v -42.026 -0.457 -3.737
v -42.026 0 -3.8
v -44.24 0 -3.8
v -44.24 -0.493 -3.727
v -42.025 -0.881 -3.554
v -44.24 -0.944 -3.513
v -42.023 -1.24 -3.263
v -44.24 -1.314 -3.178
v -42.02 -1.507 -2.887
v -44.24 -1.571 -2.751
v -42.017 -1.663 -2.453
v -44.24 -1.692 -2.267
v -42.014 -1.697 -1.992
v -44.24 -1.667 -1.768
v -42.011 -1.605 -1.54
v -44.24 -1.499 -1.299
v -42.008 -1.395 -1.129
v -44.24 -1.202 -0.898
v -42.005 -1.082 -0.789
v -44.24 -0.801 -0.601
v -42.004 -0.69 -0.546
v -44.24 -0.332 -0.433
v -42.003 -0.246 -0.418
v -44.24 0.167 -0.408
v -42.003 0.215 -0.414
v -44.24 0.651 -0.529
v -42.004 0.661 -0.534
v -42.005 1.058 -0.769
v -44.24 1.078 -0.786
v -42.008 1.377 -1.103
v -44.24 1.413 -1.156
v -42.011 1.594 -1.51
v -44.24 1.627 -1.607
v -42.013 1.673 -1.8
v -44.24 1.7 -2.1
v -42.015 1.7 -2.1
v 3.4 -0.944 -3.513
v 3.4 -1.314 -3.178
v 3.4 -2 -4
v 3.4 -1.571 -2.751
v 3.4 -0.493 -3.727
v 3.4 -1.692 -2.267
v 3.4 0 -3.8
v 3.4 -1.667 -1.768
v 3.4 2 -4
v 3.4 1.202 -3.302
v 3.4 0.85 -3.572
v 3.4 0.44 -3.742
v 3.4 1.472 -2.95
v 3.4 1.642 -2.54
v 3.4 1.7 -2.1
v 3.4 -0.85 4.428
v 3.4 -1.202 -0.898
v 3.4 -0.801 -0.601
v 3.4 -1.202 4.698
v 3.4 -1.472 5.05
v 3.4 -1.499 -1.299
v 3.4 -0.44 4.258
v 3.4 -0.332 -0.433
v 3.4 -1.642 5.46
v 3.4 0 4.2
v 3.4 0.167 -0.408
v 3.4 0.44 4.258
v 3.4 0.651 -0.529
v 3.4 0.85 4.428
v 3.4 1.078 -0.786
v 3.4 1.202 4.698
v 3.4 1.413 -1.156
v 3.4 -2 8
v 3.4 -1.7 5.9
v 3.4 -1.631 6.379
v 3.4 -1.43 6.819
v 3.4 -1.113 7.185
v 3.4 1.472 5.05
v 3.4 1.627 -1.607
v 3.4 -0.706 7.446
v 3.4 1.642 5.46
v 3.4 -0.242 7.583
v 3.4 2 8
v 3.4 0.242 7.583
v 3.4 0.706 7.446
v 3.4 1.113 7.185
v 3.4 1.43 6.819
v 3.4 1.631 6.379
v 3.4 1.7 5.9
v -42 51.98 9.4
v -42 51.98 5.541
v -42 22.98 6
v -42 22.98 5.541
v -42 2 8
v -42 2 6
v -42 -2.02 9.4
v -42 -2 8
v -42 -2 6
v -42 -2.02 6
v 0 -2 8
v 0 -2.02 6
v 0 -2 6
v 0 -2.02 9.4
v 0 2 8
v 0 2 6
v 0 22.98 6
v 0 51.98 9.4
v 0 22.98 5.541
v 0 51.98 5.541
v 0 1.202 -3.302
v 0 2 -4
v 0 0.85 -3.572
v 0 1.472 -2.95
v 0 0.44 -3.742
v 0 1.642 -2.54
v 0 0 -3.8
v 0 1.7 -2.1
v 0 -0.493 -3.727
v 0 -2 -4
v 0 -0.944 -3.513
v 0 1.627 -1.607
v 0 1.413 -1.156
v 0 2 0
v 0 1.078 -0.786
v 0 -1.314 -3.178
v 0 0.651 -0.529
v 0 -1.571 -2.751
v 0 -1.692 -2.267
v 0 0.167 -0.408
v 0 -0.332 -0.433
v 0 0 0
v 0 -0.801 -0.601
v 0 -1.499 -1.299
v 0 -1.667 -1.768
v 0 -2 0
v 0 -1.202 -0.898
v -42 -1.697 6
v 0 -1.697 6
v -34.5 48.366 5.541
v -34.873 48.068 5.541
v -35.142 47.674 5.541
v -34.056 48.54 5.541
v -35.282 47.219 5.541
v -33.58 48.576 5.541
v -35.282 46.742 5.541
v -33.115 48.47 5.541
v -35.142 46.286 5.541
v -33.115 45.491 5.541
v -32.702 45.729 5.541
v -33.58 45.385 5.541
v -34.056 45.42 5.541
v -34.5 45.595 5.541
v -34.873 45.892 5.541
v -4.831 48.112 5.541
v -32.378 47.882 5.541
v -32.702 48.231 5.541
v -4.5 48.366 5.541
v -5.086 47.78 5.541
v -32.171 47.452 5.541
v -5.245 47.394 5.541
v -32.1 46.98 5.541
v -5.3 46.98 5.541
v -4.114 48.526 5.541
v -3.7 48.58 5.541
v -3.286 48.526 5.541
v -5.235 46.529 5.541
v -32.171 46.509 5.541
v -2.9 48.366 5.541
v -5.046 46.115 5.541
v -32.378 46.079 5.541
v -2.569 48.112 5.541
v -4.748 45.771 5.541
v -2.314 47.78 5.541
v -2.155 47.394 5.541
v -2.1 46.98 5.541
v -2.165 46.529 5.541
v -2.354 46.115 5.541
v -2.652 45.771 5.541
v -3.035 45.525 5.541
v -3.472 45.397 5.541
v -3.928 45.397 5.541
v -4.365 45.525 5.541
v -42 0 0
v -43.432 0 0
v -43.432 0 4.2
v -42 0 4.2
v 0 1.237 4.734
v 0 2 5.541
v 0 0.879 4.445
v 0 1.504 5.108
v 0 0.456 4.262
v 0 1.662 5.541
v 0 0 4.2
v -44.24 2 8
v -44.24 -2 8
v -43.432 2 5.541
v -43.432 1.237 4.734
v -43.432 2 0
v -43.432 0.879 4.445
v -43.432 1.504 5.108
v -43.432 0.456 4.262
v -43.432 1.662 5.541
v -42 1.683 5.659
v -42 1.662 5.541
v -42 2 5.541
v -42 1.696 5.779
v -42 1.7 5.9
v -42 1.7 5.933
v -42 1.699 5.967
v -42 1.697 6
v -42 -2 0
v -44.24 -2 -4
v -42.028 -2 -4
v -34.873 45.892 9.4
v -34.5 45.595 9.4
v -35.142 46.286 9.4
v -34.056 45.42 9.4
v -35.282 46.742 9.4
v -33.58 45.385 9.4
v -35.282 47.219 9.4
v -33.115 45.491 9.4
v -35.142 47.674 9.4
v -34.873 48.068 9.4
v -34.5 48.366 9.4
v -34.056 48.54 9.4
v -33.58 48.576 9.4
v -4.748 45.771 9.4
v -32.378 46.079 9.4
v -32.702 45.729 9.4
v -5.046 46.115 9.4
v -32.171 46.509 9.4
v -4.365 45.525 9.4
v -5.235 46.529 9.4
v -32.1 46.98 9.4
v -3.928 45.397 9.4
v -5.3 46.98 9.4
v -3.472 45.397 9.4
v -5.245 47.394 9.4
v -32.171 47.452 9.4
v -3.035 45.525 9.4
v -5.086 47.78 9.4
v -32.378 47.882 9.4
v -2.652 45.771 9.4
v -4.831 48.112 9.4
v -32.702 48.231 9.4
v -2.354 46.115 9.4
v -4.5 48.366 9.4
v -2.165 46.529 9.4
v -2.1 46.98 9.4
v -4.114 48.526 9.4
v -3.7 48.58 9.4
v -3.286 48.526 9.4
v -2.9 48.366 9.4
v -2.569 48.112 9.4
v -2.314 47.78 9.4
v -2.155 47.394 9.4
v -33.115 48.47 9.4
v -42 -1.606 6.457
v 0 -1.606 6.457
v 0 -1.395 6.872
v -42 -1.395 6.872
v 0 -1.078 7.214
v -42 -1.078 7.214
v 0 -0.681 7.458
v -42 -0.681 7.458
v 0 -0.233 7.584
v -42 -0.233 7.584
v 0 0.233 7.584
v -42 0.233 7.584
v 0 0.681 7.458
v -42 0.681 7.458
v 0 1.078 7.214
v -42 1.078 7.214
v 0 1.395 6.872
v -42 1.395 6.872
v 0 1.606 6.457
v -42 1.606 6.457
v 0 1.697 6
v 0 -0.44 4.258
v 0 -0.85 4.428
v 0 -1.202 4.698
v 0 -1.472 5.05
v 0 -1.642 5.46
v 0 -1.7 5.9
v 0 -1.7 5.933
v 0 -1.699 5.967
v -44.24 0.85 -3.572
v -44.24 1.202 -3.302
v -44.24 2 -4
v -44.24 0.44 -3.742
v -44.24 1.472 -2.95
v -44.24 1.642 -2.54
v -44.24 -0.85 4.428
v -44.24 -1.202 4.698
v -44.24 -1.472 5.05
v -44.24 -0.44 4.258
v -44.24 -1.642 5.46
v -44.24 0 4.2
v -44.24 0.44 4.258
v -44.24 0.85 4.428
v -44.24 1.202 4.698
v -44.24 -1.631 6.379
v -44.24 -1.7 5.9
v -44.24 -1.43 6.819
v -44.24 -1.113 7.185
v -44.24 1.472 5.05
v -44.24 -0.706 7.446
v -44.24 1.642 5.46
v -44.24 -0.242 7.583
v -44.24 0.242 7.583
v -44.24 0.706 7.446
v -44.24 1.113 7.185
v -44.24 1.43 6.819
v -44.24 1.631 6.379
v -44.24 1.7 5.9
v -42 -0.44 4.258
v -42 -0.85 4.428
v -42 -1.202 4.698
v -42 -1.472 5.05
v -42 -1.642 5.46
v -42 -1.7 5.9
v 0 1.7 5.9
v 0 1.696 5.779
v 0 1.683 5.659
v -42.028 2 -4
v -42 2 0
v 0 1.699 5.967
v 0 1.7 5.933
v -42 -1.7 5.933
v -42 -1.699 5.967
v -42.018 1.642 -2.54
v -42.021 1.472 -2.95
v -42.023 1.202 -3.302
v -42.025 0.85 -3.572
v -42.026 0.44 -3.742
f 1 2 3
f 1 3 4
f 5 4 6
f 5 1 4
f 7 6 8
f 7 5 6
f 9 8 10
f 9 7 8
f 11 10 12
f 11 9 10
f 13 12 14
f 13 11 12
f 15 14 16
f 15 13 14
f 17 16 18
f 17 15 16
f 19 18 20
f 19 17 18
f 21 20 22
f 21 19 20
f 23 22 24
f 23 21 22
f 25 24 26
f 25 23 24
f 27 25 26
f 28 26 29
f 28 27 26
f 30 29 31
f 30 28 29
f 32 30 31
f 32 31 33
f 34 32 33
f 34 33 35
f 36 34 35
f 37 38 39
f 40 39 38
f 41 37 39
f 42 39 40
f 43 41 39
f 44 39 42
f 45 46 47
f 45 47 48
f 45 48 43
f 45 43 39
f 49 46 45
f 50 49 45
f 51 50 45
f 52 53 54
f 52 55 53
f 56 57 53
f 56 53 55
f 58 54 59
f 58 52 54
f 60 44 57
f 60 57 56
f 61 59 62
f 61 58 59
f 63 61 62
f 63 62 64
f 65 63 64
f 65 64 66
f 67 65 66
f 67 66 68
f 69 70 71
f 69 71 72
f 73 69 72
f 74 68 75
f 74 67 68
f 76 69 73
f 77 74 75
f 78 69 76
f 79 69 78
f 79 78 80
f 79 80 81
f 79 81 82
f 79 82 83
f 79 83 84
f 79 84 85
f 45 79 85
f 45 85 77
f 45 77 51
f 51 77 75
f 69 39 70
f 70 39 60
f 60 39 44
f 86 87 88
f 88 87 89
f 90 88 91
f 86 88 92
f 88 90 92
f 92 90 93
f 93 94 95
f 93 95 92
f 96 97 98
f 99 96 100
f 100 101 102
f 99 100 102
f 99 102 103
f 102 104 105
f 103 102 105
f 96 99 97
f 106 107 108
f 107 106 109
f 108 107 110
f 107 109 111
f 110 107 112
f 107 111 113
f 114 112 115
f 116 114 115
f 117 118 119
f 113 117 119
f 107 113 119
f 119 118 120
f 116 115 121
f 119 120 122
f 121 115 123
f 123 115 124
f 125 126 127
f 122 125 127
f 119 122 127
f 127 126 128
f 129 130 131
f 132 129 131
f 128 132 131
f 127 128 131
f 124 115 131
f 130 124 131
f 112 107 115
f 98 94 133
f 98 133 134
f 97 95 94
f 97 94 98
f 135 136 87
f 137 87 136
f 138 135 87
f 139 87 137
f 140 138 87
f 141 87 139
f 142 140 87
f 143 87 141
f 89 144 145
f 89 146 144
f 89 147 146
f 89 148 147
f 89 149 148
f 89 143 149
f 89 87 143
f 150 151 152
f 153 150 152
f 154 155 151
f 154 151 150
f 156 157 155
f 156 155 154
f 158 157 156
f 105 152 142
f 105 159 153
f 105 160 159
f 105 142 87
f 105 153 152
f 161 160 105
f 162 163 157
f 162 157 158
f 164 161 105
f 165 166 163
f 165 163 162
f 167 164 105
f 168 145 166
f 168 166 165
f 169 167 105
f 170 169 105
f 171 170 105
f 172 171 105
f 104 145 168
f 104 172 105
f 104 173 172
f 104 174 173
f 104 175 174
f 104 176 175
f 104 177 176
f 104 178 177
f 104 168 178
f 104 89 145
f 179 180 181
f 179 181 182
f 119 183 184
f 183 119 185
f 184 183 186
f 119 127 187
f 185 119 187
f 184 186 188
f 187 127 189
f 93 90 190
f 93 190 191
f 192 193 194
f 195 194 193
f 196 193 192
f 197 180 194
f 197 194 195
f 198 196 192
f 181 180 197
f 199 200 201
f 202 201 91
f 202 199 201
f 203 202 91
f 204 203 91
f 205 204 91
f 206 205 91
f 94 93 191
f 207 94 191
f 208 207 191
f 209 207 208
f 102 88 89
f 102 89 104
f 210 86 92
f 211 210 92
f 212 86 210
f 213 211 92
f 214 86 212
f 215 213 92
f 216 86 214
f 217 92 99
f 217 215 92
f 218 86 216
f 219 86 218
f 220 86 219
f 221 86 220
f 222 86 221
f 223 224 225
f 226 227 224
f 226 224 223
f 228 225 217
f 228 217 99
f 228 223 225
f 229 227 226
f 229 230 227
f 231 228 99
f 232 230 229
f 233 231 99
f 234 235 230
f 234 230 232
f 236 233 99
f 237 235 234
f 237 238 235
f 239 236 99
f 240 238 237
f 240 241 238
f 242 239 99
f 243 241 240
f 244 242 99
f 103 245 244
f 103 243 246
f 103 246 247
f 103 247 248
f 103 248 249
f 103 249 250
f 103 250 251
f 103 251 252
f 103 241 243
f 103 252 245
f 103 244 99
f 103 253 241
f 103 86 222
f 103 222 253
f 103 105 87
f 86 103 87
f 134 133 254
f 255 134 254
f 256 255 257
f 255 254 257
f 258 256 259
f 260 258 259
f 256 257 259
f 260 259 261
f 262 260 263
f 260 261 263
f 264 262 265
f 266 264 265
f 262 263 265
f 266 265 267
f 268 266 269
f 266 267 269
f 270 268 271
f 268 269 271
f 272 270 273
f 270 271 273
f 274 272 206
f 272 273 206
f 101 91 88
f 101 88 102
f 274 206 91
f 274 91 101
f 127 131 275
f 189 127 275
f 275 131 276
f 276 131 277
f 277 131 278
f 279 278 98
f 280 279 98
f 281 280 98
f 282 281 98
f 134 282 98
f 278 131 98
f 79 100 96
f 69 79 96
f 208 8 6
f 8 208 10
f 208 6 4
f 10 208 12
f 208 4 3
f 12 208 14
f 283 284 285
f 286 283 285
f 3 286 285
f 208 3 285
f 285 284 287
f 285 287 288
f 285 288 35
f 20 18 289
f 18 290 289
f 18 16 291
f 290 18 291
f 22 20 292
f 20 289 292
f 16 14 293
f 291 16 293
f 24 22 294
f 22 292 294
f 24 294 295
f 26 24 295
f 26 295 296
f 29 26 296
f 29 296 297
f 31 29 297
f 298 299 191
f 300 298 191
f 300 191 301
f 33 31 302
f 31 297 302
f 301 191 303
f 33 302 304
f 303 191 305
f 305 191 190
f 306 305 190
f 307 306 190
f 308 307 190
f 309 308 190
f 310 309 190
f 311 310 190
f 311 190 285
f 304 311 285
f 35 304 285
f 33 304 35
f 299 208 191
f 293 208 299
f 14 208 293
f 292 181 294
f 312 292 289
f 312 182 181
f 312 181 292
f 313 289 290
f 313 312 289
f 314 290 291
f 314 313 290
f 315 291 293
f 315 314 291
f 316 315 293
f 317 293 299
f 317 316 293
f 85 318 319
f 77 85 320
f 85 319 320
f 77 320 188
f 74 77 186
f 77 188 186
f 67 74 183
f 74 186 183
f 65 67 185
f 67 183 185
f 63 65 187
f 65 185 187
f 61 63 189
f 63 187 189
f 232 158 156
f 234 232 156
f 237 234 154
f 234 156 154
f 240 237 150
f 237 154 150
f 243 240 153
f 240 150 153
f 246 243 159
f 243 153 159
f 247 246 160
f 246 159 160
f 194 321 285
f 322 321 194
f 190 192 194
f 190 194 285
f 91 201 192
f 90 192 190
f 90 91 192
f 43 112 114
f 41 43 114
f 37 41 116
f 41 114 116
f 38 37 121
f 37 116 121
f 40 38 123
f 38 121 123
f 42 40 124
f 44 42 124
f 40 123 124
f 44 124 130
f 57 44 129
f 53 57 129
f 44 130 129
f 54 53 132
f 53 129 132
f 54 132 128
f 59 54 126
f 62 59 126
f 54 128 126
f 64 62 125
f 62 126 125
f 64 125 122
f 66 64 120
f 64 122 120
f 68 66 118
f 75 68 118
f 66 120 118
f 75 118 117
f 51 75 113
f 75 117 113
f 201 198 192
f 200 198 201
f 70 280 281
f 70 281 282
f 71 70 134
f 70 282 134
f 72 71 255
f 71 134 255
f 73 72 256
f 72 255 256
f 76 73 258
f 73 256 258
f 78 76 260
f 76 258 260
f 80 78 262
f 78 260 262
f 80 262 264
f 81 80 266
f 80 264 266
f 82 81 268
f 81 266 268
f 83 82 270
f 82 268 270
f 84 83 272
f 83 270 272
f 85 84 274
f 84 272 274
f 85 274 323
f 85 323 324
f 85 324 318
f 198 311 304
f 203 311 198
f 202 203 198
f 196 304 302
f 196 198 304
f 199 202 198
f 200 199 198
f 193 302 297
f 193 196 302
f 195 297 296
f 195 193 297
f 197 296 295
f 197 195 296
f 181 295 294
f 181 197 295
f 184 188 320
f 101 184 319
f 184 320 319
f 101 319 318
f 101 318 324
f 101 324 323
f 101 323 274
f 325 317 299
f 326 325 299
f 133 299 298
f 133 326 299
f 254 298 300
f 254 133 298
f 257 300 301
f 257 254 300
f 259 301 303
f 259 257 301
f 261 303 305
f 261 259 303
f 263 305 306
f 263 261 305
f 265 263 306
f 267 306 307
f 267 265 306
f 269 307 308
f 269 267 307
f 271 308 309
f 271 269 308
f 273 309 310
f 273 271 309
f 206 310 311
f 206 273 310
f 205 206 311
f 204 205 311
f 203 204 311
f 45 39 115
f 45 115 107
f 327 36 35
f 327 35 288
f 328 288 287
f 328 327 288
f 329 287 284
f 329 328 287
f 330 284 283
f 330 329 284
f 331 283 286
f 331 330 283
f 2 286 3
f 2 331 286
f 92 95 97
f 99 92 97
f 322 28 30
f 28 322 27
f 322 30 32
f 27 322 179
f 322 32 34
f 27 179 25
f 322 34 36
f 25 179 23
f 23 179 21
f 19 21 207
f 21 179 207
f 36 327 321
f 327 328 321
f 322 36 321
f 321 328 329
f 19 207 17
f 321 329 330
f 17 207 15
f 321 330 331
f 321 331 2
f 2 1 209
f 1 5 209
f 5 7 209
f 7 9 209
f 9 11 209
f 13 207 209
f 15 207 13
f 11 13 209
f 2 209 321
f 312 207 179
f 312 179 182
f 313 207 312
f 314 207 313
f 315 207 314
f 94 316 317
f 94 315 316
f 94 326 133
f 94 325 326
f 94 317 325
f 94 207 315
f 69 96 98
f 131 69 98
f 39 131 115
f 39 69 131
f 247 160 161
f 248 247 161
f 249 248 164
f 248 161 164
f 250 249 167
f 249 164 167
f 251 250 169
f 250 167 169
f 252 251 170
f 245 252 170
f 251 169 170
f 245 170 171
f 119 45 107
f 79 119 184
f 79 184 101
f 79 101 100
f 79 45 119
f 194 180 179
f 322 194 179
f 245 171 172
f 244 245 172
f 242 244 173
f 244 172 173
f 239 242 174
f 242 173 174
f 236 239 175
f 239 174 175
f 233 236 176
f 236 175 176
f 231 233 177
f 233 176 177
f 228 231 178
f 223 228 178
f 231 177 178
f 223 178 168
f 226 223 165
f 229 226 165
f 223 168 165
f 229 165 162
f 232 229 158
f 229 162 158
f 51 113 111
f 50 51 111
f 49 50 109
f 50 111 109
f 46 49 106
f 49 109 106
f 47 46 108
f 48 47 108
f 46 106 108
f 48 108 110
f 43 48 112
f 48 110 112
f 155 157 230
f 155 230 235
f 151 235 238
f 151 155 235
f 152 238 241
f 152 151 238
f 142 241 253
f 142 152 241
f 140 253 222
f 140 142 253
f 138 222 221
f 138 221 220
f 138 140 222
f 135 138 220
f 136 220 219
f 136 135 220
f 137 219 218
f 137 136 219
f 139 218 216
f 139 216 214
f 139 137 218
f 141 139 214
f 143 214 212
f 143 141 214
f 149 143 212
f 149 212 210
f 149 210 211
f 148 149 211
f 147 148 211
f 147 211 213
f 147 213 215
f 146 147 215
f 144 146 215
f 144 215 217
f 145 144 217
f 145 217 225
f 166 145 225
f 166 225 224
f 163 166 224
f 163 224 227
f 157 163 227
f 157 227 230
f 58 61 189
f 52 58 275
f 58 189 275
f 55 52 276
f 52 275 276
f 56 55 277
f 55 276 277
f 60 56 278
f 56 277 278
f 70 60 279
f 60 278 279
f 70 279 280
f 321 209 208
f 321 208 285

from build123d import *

# Parameters (mm, degrees)
F1_DEPTH  = 3.4
F2_R      = 1.6
F2_W      = 2
F2_H      = 5
F3_DEPTH  = 9.4
F4_DEPTH  = 44.24
F5_W      = 43.4320680797
F5_H      = 5.540763028
F6_DEPTH  = 55
F7_W      = 42
F7_H      = 6
F8_DEPTH  = 25
F9_D      = 3.4
F11_DEPTH = 25


# Not quite as in the source:
# - after a boolean that leaves OpenCascade's solid faulty, fix() repairs it
# - a feature names something its author has since deleted; it is built from what else it names


with BuildPart() as f1:
    # F0 (on Right) → F1 (new body)
    with BuildSketch(Plane.YZ):
        Polygon((0, 4), (-2, 4), (-2, -4), (0, -4), (2, -4), (2, 4), align=None)
        with BuildLine():
            ThreePointArc((1.7, -2.1), (1.202081528, -3.302081528), (0, -3.8))
            ThreePointArc((0, -3.8), (-1.202081528, -0.897918472), (1.7, -2.1))
        make_face(mode=Mode.SUBTRACT)
        Polygon((-2, 8), (-2, 4), (0, 4), (2, 4), (2, 8), align=None)
        with BuildLine():
            ThreePointArc((1.7, 5.9), (1.202081528, 4.697918472), (0, 4.2))
            ThreePointArc((0, 4.2), (-1.202081528, 7.102081528), (1.7, 5.9))
        make_face(mode=Mode.SUBTRACT)
    extrude(amount=F1_DEPTH)

    # F2 (on Top) → F3 (join)
    with BuildSketch(Plane.XY):
        with BuildLine():
            Line((-42, -2.019777894), (0, -2.019777894))
            Line((0, -2.019777894), (0, 1.980222106))
            Line((0, 1.980222106), (0, 46.980222106))
            Line((0, 46.980222106), (-2, 46.980222106))
            Line((-2, 46.980222106), (-2.1, 46.980222106))
            ThreePointArc((-2.1, 46.980222106), (-3.7, 45.380222106), (-5.3, 46.980222106))
            ThreePointArc((-5.3, 46.980222106), (-4.8313708499, 48.1115929559), (-3.7, 48.580222106))
            Line((-3.7, 48.580222106), (-3.7, 51.980222106))
            Line((-3.7, 51.980222106), (-42, 51.980222106))
            Line((-42, 51.980222106), (-42, 1.980222106))
            Line((-42, 1.980222106), (-42, -2.019777894))
        make_face()
        with Locations((-33.7, 46.980222106)):
            Circle(F2_R, mode=Mode.SUBTRACT)
        with BuildLine():
            Line((-2.1, 46.980222106), (-2, 46.980222106))
            Line((-2, 46.980222106), (-2, 51.980222106))
            Line((-2, 51.980222106), (-3.7, 51.980222106))
            Line((-3.7, 51.980222106), (-3.7, 48.580222106))
            ThreePointArc((-3.7, 48.580222106), (-2.5686291501, 48.1115929559), (-2.1, 46.980222106))
        make_face()
        with Locations((-1, 49.480222106)):
            Rectangle(F2_W, F2_H)
    extrude(amount=F3_DEPTH)

    # F0 (on Right) → F4 (join)
    with BuildSketch(Plane.YZ):
        Polygon((0, 4), (-2, 4), (-2, -4), (0, -4), (2, -4), (2, 4), align=None)
        with BuildLine():
            ThreePointArc((1.7, -2.1), (1.202081528, -3.302081528), (0, -3.8))
            ThreePointArc((0, -3.8), (-1.202081528, -0.897918472), (1.7, -2.1))
        make_face(mode=Mode.SUBTRACT)
        Polygon((-2, 8), (-2, 4), (0, 4), (2, 4), (2, 8), align=None)
        with BuildLine():
            ThreePointArc((1.7, 5.9), (1.202081528, 4.697918472), (0, 4.2))
            ThreePointArc((0, 4.2), (-1.202081528, 7.102081528), (1.7, 5.9))
        make_face(mode=Mode.SUBTRACT)
    extrude(amount=-F4_DEPTH)

    # F5 (on Front) → F6 (cut)
    with BuildSketch(Plane.XZ):
        with Locations((-21.7160340399, 2.770381514)):
            Rectangle(F5_W, F5_H)
    extrude(amount=-F6_DEPTH, mode=Mode.SUBTRACT)

    # F7 (on face) → F8 (cut)
    with BuildSketch(Plane.XZ.offset(2.019777894)):
        with Locations((-21, 3)):
            Rectangle(F7_W, F7_H)
    extrude(amount=-F8_DEPTH, mode=Mode.SUBTRACT)

    # F9 (through all)
    with Locations(Plane.YZ):
        with Locations((0, 5.9)):
            Hole(F9_D / 2)

    # F10 (on face) → F11 (cut)
    with BuildSketch(Plane.XZ.offset(2)):
        Polygon((0, -4), (0, 0), (-42, 0), (-42.0278720558, -4), align=None)
    extrude(amount=-F11_DEPTH, mode=Mode.SUBTRACT)

    add(f1.part.fix(), mode=Mode.REPLACE)


solid = f1.part
